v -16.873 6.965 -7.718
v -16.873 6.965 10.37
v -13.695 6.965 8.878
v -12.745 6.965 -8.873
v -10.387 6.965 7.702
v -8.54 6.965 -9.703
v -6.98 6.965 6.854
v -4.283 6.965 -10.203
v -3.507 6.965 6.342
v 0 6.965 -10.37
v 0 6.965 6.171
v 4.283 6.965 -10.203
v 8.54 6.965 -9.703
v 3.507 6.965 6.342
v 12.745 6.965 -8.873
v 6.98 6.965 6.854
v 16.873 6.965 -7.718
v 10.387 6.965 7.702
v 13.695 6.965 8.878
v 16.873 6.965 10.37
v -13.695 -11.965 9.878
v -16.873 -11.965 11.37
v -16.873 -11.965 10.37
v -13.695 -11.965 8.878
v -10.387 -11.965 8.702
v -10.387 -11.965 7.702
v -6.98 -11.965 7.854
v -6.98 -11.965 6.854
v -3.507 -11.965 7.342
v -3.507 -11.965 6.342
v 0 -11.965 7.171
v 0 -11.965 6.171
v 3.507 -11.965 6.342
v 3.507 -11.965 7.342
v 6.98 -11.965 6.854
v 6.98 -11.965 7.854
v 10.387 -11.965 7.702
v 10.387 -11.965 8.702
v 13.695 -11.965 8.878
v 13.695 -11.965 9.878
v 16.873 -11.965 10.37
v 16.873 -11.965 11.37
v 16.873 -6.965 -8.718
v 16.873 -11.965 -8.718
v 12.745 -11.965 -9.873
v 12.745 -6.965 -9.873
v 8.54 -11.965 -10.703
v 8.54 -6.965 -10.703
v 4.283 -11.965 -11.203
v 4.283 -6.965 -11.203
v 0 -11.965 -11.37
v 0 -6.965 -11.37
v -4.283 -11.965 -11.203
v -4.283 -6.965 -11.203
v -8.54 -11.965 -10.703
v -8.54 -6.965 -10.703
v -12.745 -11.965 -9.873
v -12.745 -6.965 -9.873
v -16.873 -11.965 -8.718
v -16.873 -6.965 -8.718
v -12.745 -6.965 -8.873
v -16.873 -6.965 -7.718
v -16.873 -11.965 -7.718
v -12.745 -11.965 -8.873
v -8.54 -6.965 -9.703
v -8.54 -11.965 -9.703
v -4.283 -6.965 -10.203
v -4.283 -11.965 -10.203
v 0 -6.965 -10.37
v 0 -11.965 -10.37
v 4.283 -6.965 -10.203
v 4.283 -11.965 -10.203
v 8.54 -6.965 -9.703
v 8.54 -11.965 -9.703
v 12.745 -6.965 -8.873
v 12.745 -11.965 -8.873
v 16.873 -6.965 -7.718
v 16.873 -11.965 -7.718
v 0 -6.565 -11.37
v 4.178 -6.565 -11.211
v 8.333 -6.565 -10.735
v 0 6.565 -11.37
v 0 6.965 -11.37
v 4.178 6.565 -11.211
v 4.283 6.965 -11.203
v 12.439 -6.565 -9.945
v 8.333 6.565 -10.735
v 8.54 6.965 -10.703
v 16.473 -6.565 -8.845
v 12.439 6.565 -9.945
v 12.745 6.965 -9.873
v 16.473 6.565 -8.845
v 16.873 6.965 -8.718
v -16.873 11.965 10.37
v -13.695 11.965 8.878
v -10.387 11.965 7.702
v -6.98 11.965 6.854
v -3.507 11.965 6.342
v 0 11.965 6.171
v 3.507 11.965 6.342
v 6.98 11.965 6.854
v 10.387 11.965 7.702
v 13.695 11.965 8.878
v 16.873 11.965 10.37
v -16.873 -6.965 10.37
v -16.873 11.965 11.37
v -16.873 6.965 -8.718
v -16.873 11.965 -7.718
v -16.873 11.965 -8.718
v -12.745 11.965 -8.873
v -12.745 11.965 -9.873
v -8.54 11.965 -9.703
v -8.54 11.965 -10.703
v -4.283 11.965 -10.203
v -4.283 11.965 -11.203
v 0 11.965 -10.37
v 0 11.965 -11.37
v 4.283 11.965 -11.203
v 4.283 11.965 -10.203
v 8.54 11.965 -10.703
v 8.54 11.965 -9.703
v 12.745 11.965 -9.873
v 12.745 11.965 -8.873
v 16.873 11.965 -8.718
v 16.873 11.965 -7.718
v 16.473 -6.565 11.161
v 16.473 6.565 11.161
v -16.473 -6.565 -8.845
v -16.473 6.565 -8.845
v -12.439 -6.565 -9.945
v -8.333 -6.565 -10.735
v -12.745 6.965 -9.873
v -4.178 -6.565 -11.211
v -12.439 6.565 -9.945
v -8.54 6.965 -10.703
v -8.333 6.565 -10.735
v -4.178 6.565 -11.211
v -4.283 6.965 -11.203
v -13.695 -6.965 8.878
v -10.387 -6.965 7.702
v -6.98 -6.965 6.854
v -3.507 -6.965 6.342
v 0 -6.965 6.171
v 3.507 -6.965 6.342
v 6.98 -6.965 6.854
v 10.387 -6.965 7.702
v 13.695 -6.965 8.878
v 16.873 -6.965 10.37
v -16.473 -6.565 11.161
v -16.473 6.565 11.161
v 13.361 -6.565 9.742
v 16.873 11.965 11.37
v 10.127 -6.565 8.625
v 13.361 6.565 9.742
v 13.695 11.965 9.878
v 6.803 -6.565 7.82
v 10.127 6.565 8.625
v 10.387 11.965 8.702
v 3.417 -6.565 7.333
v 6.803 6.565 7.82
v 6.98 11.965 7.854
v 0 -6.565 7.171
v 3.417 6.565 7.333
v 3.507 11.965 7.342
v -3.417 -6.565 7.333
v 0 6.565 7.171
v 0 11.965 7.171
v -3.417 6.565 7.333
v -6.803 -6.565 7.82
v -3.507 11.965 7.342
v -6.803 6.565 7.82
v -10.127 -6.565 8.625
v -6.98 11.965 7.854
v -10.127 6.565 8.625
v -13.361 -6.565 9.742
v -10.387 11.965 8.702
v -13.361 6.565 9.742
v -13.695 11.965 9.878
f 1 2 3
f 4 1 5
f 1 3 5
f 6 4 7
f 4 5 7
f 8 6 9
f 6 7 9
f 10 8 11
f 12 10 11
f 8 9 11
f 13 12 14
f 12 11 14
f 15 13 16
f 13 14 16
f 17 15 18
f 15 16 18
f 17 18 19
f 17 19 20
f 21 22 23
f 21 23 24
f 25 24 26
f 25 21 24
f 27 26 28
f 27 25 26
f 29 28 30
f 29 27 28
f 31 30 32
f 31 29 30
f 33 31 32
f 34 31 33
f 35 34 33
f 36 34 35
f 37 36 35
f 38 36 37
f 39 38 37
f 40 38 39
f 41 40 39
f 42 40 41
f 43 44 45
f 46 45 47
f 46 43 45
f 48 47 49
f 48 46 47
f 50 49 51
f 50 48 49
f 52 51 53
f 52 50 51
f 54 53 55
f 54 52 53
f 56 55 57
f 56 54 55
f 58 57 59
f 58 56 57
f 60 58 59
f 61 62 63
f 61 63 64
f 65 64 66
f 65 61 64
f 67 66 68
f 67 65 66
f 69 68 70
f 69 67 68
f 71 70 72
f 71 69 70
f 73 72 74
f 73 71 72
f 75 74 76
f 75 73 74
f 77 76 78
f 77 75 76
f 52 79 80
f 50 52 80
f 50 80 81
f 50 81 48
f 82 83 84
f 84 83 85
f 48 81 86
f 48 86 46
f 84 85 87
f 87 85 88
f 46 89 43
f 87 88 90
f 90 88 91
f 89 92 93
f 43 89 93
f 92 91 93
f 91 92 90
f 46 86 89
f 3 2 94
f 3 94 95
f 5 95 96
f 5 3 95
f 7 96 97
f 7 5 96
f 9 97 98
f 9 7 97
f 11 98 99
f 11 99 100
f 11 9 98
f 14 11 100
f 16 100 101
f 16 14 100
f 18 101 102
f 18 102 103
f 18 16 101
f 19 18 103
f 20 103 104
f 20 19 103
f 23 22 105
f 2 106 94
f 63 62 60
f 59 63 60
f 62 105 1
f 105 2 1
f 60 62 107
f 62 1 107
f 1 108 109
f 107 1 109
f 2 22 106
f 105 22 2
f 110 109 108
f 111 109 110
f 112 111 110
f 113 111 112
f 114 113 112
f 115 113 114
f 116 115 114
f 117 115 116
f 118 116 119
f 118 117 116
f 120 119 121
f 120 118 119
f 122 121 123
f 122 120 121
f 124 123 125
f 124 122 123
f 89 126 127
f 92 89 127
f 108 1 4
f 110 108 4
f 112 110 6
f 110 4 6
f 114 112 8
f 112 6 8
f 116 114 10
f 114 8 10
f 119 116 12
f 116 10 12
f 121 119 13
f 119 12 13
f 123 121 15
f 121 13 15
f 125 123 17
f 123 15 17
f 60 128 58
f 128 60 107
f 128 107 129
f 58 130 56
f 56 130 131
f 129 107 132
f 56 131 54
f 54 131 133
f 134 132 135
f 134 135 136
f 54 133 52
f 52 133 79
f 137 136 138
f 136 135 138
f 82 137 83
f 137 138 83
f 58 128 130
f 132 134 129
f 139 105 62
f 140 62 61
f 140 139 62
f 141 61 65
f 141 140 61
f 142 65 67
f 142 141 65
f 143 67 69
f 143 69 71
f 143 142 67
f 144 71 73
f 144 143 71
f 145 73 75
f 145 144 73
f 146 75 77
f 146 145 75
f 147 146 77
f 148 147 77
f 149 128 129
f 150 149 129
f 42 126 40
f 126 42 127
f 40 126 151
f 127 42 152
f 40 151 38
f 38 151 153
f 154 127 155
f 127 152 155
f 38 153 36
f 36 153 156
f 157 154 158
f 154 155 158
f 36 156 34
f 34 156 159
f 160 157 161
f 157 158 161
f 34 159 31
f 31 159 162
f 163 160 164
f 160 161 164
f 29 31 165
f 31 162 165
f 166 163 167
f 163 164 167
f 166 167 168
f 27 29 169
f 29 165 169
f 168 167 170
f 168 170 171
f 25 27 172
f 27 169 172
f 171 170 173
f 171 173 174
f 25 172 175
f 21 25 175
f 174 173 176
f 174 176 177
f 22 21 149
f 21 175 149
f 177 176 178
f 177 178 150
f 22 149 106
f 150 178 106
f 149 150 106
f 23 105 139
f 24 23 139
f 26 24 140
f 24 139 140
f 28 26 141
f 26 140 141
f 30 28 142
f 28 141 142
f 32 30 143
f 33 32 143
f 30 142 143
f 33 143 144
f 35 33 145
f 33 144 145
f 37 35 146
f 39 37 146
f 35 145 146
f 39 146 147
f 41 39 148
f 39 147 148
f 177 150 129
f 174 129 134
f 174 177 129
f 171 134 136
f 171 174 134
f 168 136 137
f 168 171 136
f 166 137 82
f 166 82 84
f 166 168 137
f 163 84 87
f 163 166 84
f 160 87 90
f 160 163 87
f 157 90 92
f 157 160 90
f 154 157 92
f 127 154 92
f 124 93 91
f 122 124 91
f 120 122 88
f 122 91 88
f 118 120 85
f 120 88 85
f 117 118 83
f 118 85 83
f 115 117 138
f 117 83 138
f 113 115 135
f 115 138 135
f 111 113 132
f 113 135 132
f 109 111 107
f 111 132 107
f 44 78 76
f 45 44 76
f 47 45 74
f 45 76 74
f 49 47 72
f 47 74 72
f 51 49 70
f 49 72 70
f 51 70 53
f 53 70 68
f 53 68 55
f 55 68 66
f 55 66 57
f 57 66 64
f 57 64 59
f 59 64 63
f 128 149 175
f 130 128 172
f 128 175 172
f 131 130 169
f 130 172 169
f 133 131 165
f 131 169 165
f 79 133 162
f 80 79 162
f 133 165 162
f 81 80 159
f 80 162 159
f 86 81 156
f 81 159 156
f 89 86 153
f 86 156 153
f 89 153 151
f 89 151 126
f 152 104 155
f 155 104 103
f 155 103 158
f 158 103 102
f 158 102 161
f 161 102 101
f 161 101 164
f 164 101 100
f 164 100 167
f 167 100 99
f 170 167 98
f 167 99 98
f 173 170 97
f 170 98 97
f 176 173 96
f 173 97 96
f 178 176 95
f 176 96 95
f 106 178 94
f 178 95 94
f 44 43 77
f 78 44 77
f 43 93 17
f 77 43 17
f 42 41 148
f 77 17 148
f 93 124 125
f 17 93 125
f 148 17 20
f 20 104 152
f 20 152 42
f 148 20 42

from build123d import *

# Parameters (mm, degrees)
SKETCH1_W           = 33.746
SKETCH1_H           = 13.93
SKETCH1_W_2         = 32.946
SKETCH1_H_2         = 13.13
BOSS_EXTRUDE1_DEPTH = 11.37
CUT_EXTRUDE1_DEPTH  = 25.658060122
BOSS_EXTRUDE2_DEPTH = 5
BOSS_EXTRUDE3_DEPTH = 5


with BuildPart() as part:
    # Sketch1 → Boss-Extrude1 (new, symmetric)
    with BuildSketch(Plane.XY):
        Rectangle(SKETCH1_W, SKETCH1_H)
        Rectangle(SKETCH1_W_2, SKETCH1_H_2, mode=Mode.SUBTRACT)
    extrude(amount=BOSS_EXTRUDE1_DEPTH, both=True)

    # Sketch3 → Cut-Extrude1 (cut, through all)
    with BuildSketch(Plane(origin=(0, 6.965, 0), x_dir=(1, 0, 0), z_dir=(0, 1, 0))):
        with BuildLine():
            ThreePointArc((0, 11.37), (8.54007907, 10.702927857), (16.873, 8.717892708))
            Line((16.873, 8.717892708), (16.873, 11.37))
            Line((16.873, 11.37), (0, 11.37))
        make_face()
        with BuildLine():
            Line((-16.873, 11.37), (-16.873, 8.717892708))
            ThreePointArc((-16.873, 8.717892708), (-8.54007907, 10.702927857), (0, 11.37))
            Line((0, 11.37), (-16.873, 11.37))
        make_face()
        with BuildLine():
            ThreePointArc((16.873, -11.37), (0, -7.1709728), (-16.873, -11.37))
            Line((-16.873, -11.37), (16.873, -11.37))
        make_face()
    extrude(amount=-CUT_EXTRUDE1_DEPTH, mode=Mode.SUBTRACT)

    # Sketch4 → Boss-Extrude2 (add)
    with BuildSketch(Plane(origin=(0, 6.965, 0), x_dir=(1, 0, 0), z_dir=(0, 1, 0))):
        with BuildLine():
            Line((-16.873, -11.37), (-16.873, -10.37))
            ThreePointArc((-16.873, -10.37), (0, -6.1709728), (16.873, -10.37))
            Line((16.873, -10.37), (16.873, -11.37))
            ThreePointArc((16.873, -11.37), (0, -7.1709728), (-16.873, -11.37))
        make_face()
        with BuildLine():
            Line((-16.873, 8.717892708), (-16.873, 7.717892708))
            ThreePointArc((-16.873, 7.717892708), (0, 10.37), (16.873, 7.717892708))
            Line((16.873, 7.717892708), (16.873, 8.717892708))
            ThreePointArc((16.873, 8.717892708), (0, 11.37), (-16.873, 8.717892708))
        make_face()
    extrude(amount=BOSS_EXTRUDE2_DEPTH)

    # Sketch5 → Boss-Extrude3 (add)
    with BuildSketch(Plane.XZ.offset(6.965)):
        with BuildLine():
            Line((-16.873, 11.37), (-16.873, 10.37))
            ThreePointArc((-16.873, 10.37), (0, 6.1709728), (16.873, 10.37))
            Line((16.873, 10.37), (16.873, 11.37))
            ThreePointArc((16.873, 11.37), (0, 7.1709728), (-16.873, 11.37))
        make_face()
        with BuildLine():
            Line((-16.873, -8.717892708), (-16.873, -7.717892708))
            ThreePointArc((-16.873, -7.717892708), (0, -10.37), (16.873, -7.717892708))
            Line((16.873, -7.717892708), (16.873, -8.717892708))
            ThreePointArc((16.873, -8.717892708), (0, -11.37), (-16.873, -8.717892708))
        make_face()
    extrude(amount=BOSS_EXTRUDE3_DEPTH)


solid = part.part
